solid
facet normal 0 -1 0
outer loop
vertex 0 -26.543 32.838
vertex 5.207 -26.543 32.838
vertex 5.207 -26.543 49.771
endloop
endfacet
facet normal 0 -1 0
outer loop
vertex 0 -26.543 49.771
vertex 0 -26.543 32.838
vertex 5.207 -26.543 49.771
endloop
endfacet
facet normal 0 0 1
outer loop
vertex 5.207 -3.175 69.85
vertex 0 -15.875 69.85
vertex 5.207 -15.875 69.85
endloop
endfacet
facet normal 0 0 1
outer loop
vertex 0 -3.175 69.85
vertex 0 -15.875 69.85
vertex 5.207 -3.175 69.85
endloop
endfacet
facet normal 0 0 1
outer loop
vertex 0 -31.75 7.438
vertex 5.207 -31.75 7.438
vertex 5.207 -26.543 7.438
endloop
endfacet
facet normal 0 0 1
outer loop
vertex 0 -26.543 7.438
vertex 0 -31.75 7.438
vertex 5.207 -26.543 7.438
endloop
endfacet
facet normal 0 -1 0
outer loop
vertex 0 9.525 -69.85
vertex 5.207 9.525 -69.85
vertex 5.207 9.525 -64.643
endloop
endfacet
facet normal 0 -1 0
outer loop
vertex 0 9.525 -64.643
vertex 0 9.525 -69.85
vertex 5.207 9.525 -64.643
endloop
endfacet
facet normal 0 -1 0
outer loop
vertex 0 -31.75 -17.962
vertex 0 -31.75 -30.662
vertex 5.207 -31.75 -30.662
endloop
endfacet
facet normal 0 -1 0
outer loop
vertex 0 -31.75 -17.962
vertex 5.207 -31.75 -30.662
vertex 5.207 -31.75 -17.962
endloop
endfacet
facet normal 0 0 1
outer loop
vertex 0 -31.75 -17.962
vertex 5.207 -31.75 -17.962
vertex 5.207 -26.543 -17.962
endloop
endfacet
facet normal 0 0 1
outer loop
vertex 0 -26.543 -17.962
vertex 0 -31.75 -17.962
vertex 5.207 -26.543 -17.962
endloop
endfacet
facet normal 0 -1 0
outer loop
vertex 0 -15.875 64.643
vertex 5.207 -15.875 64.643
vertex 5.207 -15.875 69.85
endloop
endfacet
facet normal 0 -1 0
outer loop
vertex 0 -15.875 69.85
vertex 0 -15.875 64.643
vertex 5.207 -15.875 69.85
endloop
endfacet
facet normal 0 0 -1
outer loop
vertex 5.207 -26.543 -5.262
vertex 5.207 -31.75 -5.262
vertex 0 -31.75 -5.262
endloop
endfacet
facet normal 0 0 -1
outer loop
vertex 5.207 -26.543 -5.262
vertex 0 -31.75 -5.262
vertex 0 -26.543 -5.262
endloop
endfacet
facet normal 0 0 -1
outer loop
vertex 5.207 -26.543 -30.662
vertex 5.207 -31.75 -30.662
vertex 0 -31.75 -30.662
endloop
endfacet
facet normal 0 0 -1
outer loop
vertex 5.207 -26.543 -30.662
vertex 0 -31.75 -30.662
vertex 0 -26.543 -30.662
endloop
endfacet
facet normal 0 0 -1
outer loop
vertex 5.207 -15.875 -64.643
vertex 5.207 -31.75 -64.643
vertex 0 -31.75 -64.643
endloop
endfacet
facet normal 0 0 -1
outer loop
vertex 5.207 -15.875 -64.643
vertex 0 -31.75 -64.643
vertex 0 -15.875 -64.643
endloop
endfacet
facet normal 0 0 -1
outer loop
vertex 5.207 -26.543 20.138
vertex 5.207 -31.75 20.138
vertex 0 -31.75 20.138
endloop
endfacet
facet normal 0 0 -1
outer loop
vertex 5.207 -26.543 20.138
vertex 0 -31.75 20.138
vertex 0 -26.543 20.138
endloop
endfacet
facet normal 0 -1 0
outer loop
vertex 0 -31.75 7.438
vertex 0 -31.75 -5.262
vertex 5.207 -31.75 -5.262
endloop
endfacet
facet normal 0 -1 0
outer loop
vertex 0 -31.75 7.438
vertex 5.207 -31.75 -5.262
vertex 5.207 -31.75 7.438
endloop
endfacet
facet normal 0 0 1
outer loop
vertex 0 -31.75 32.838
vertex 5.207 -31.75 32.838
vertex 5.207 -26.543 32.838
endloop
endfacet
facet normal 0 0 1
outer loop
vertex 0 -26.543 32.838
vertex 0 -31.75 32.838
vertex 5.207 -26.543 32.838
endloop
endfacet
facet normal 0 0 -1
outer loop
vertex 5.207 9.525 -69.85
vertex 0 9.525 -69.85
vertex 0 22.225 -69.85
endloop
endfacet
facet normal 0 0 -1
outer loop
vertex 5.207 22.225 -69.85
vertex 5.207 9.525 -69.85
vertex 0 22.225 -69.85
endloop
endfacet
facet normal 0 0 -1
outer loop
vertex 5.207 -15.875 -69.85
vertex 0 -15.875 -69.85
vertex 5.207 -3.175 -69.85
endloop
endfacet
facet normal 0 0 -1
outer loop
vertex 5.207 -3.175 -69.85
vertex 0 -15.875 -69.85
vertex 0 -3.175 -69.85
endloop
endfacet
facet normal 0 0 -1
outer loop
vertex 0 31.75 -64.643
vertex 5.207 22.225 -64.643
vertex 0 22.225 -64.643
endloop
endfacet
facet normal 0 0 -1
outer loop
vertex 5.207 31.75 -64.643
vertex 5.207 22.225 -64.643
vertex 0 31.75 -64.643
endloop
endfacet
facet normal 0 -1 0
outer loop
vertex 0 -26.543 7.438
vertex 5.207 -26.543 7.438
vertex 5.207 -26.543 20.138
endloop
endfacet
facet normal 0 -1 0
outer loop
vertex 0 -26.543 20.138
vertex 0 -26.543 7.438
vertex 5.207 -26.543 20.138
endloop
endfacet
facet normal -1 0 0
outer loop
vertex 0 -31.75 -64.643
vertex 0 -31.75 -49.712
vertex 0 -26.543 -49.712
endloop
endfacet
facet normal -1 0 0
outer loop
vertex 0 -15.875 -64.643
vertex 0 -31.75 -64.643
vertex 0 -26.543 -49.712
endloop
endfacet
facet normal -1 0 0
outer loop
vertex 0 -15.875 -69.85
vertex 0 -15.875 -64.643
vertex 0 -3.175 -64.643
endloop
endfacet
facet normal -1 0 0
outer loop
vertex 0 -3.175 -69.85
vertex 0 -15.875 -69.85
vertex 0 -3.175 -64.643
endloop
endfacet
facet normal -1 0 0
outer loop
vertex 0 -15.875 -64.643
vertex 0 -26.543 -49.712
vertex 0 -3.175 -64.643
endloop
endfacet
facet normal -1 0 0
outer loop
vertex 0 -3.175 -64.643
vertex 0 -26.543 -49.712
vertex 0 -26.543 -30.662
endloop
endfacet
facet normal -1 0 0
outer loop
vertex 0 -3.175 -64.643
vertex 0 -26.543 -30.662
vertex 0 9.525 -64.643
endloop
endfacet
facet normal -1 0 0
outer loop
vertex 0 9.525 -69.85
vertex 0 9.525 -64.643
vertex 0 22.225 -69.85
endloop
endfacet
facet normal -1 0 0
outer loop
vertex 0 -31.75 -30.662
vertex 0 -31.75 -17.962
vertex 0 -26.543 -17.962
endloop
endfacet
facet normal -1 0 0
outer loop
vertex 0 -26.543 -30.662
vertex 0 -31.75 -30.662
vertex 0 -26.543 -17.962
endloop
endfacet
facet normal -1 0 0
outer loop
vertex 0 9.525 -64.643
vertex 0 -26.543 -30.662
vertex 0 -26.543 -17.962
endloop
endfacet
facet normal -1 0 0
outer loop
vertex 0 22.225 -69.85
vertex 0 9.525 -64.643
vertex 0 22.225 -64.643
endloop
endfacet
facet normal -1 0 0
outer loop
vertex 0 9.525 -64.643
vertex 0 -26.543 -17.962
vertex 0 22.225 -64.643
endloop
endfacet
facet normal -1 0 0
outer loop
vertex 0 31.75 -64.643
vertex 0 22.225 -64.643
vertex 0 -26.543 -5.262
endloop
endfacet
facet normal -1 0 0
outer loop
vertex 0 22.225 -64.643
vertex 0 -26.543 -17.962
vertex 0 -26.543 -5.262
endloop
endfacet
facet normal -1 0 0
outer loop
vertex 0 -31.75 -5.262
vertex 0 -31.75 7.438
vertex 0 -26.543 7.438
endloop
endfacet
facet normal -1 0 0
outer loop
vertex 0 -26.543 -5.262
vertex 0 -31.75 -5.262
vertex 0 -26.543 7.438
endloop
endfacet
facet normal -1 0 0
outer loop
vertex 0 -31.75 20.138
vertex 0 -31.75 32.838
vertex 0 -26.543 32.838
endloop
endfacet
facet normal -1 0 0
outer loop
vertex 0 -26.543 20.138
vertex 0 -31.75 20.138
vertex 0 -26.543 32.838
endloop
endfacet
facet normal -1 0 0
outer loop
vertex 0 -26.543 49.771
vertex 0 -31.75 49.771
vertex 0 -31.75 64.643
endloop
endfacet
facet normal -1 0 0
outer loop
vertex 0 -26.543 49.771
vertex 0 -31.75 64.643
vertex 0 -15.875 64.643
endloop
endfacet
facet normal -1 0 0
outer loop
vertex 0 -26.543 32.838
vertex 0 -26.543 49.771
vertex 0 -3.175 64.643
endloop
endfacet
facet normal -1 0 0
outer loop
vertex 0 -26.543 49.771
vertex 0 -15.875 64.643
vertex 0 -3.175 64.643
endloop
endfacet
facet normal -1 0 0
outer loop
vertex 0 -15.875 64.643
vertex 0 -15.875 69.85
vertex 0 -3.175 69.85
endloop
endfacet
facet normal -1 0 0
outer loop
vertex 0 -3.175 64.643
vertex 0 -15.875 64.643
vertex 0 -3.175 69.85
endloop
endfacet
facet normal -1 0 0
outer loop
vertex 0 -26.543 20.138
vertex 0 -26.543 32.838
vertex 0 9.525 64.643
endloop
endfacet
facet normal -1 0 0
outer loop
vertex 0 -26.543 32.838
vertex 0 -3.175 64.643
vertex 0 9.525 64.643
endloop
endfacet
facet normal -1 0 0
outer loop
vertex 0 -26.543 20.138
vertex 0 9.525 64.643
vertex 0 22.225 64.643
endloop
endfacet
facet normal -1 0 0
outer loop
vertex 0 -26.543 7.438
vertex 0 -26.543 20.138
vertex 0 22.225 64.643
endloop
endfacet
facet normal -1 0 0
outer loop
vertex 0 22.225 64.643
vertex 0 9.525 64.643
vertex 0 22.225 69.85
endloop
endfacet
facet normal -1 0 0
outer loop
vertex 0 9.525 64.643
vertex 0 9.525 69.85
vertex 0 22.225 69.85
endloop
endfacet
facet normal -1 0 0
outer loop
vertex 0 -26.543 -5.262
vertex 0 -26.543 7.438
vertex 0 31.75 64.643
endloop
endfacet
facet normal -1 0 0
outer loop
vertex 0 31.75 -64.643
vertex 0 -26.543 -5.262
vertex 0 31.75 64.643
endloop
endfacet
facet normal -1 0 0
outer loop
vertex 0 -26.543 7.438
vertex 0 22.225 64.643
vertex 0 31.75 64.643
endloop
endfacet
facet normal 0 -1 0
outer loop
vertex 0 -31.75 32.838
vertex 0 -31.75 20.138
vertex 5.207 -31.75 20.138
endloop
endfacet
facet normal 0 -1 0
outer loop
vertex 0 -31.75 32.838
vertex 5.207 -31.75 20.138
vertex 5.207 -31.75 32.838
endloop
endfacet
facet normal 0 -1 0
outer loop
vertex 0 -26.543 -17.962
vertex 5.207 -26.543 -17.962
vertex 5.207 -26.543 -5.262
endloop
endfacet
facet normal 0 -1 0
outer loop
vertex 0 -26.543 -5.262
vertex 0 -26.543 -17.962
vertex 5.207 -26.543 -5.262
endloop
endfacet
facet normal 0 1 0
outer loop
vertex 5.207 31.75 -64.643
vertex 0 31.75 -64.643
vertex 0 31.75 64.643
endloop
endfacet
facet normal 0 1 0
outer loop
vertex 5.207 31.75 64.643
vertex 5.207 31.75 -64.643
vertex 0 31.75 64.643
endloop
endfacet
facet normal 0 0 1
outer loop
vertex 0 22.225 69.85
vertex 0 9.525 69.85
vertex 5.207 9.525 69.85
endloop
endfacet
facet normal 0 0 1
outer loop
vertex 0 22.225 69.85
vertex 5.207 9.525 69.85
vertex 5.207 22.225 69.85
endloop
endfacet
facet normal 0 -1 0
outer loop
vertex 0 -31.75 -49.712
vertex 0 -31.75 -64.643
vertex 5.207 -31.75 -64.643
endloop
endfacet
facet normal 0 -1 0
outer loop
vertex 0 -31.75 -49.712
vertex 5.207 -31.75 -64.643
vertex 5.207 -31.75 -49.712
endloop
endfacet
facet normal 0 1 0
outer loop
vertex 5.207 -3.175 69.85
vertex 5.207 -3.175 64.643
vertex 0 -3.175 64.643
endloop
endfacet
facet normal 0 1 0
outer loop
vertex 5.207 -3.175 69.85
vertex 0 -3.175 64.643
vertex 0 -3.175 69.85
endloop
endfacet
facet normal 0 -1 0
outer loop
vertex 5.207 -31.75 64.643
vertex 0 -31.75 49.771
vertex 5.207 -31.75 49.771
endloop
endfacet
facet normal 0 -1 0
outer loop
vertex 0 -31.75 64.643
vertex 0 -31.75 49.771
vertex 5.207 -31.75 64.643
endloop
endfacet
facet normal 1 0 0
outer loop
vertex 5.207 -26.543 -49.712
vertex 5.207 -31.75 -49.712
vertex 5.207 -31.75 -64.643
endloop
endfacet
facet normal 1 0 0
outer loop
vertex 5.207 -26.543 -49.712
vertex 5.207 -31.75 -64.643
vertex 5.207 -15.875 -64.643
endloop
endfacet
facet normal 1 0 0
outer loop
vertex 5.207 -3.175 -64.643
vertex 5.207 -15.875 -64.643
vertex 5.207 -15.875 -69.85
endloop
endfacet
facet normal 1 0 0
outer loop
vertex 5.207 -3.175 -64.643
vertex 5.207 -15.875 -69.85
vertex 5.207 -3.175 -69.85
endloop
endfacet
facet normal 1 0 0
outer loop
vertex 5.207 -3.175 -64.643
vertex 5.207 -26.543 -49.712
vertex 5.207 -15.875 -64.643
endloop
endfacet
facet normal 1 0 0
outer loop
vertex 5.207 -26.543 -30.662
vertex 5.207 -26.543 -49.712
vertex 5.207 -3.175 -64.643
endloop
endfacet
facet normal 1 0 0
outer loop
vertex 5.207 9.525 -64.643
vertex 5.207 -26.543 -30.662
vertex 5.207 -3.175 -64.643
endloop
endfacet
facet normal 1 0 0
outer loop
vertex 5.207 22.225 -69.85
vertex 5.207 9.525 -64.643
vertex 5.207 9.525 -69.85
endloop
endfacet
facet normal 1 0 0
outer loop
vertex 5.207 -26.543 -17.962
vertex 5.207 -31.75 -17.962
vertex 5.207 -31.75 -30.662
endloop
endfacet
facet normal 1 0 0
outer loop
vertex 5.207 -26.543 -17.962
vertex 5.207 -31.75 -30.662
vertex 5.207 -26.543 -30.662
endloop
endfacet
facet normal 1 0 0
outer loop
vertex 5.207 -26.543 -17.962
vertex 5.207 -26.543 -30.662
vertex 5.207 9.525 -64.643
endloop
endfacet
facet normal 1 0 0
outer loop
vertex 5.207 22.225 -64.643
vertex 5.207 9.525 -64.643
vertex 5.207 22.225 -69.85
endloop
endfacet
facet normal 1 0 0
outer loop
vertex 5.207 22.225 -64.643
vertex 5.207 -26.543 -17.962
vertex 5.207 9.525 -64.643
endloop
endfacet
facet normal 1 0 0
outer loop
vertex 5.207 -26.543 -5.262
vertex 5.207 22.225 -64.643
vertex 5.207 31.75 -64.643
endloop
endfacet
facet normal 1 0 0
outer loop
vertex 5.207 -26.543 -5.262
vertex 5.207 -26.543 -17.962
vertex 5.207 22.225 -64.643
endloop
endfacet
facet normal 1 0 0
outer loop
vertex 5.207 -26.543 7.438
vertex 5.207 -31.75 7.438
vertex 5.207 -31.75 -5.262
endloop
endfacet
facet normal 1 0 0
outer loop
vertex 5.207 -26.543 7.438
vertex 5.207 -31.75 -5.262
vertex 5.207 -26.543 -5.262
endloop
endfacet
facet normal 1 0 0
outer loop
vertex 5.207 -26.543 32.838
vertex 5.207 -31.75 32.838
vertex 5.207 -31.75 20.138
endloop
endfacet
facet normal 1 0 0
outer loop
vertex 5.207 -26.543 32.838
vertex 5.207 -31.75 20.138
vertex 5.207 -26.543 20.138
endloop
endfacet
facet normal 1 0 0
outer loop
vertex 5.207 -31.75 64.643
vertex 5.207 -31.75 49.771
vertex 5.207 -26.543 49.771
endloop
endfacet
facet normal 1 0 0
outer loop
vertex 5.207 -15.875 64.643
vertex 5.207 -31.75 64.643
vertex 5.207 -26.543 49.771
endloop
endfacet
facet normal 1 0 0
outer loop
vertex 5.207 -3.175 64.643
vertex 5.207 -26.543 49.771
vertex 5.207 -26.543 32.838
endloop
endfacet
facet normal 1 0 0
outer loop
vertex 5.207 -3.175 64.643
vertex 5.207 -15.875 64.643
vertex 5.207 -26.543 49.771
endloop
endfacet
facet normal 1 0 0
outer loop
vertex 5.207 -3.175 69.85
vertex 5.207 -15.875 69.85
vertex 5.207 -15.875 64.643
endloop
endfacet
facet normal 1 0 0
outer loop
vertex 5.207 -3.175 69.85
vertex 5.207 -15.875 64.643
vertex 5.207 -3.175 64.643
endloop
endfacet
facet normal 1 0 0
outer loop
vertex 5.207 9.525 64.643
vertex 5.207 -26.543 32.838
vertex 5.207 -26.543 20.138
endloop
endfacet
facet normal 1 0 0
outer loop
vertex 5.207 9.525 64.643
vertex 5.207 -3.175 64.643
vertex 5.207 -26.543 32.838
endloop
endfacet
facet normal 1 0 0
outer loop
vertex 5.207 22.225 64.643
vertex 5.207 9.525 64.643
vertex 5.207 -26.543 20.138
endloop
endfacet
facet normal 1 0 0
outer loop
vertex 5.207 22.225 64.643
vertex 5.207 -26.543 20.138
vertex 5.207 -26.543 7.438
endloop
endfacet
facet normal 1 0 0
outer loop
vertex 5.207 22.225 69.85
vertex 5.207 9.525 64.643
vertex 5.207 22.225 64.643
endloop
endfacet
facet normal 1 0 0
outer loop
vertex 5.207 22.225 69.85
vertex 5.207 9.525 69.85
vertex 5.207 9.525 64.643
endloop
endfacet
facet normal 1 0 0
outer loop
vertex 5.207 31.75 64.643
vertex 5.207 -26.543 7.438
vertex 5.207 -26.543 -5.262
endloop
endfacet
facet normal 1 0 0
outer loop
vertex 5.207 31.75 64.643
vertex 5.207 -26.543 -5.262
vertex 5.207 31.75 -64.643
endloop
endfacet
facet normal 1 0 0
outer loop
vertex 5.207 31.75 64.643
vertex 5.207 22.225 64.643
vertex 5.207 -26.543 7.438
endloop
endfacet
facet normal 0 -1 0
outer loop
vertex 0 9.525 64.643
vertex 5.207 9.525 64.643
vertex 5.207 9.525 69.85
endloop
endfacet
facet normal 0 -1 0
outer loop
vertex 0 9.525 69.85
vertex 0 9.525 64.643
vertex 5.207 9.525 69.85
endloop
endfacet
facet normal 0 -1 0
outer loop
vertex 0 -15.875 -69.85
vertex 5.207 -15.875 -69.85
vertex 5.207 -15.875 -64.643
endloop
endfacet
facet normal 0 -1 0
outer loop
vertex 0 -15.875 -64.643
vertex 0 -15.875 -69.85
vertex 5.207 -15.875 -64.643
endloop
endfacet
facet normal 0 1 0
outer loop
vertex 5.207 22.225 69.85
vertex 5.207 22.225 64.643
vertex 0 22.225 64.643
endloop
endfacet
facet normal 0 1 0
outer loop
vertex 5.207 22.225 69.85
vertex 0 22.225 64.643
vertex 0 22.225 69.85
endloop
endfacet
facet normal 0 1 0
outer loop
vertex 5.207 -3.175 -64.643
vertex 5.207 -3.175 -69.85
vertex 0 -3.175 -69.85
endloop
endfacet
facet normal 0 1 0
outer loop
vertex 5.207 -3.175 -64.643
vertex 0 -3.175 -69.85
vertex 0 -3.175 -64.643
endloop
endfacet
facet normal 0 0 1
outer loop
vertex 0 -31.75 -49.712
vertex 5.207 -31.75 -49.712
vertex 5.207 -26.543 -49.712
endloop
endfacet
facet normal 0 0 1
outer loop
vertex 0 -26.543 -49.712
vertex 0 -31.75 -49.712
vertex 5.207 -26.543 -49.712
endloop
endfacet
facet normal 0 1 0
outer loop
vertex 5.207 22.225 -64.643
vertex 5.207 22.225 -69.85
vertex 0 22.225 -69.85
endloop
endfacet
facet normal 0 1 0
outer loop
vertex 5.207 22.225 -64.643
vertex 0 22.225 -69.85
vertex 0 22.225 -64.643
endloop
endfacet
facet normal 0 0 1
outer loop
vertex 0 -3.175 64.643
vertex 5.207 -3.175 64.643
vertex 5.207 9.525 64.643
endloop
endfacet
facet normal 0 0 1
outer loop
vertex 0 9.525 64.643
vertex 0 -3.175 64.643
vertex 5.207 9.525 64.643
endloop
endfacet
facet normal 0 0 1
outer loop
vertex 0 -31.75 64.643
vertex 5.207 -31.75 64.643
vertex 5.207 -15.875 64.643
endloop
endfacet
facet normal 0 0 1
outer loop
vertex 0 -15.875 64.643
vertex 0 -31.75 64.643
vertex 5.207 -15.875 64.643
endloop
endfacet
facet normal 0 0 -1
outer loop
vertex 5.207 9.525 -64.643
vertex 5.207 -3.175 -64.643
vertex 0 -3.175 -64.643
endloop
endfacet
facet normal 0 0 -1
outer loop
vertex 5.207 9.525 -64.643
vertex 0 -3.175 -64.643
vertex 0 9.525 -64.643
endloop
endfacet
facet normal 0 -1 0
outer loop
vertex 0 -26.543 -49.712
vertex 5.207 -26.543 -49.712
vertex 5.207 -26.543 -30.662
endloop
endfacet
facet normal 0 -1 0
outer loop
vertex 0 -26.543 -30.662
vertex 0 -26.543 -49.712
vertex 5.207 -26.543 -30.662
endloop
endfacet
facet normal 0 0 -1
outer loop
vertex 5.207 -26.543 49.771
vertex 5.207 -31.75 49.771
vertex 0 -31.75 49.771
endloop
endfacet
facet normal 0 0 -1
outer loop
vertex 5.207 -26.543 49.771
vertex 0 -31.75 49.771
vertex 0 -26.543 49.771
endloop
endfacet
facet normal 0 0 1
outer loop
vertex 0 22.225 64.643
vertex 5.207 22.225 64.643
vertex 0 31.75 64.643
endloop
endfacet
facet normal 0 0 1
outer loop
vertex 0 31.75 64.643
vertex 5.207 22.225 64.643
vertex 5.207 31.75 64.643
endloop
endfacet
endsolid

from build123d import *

# Parameters (mm, degrees)
F0_W     = 63.5
F0_H     = 139.7
F1_DEPTH = 5.207
F2_W     = 5.207
F2_H     = 16.9333164
F2_H_2   = 12.7
F2_H_3   = 19.05
F2_W_2   = 15.875
F2_H_4   = 5.207
F2_W_3   = 12.7
F2_W_4   = 9.525
F3_DEPTH = 5.208


# Not quite as in the source:
# - a feature names something its author has since deleted; it is built from what else it names


with BuildPart() as f1:
    # F0 (on Right) → F1 (new body)
    with BuildSketch(Plane.YZ):
        Rectangle(F0_W, F0_H)
    extrude(amount=F1_DEPTH)

    # F2 (on face) → F3 (cut, through all)
    with BuildSketch(Plane.YZ.offset(5.207)):
        with Locations((-29.1465, 41.3046418)):
            Rectangle(F2_W, F2_H)
        with Locations((-29.1465, 13.7879836)):
            Rectangle(F2_W, F2_H_2)
        with Locations((-29.1465, -11.6120164)):
            Rectangle(F2_W, F2_H_2)
        with Locations((-29.1465, -40.1870164)):
            Rectangle(F2_W, F2_H_3)
        with Locations((-23.8125, -67.2465)):
            Rectangle(F2_W_2, F2_H_4)
        with Locations((3.175, -67.2465)):
            Rectangle(F2_W_3, F2_H_4)
        with Locations((26.9875, -67.2465)):
            Rectangle(F2_W_4, F2_H_4)
        with Locations((26.9875, 67.2465)):
            Rectangle(F2_W_4, F2_H_4)
        with Locations((3.175, 67.2465)):
            Rectangle(F2_W_3, F2_H_4)
        with Locations((-23.8125, 67.2465)):
            Rectangle(F2_W_2, F2_H_4)
    extrude(amount=-F3_DEPTH, mode=Mode.SUBTRACT)


solid = f1.part
